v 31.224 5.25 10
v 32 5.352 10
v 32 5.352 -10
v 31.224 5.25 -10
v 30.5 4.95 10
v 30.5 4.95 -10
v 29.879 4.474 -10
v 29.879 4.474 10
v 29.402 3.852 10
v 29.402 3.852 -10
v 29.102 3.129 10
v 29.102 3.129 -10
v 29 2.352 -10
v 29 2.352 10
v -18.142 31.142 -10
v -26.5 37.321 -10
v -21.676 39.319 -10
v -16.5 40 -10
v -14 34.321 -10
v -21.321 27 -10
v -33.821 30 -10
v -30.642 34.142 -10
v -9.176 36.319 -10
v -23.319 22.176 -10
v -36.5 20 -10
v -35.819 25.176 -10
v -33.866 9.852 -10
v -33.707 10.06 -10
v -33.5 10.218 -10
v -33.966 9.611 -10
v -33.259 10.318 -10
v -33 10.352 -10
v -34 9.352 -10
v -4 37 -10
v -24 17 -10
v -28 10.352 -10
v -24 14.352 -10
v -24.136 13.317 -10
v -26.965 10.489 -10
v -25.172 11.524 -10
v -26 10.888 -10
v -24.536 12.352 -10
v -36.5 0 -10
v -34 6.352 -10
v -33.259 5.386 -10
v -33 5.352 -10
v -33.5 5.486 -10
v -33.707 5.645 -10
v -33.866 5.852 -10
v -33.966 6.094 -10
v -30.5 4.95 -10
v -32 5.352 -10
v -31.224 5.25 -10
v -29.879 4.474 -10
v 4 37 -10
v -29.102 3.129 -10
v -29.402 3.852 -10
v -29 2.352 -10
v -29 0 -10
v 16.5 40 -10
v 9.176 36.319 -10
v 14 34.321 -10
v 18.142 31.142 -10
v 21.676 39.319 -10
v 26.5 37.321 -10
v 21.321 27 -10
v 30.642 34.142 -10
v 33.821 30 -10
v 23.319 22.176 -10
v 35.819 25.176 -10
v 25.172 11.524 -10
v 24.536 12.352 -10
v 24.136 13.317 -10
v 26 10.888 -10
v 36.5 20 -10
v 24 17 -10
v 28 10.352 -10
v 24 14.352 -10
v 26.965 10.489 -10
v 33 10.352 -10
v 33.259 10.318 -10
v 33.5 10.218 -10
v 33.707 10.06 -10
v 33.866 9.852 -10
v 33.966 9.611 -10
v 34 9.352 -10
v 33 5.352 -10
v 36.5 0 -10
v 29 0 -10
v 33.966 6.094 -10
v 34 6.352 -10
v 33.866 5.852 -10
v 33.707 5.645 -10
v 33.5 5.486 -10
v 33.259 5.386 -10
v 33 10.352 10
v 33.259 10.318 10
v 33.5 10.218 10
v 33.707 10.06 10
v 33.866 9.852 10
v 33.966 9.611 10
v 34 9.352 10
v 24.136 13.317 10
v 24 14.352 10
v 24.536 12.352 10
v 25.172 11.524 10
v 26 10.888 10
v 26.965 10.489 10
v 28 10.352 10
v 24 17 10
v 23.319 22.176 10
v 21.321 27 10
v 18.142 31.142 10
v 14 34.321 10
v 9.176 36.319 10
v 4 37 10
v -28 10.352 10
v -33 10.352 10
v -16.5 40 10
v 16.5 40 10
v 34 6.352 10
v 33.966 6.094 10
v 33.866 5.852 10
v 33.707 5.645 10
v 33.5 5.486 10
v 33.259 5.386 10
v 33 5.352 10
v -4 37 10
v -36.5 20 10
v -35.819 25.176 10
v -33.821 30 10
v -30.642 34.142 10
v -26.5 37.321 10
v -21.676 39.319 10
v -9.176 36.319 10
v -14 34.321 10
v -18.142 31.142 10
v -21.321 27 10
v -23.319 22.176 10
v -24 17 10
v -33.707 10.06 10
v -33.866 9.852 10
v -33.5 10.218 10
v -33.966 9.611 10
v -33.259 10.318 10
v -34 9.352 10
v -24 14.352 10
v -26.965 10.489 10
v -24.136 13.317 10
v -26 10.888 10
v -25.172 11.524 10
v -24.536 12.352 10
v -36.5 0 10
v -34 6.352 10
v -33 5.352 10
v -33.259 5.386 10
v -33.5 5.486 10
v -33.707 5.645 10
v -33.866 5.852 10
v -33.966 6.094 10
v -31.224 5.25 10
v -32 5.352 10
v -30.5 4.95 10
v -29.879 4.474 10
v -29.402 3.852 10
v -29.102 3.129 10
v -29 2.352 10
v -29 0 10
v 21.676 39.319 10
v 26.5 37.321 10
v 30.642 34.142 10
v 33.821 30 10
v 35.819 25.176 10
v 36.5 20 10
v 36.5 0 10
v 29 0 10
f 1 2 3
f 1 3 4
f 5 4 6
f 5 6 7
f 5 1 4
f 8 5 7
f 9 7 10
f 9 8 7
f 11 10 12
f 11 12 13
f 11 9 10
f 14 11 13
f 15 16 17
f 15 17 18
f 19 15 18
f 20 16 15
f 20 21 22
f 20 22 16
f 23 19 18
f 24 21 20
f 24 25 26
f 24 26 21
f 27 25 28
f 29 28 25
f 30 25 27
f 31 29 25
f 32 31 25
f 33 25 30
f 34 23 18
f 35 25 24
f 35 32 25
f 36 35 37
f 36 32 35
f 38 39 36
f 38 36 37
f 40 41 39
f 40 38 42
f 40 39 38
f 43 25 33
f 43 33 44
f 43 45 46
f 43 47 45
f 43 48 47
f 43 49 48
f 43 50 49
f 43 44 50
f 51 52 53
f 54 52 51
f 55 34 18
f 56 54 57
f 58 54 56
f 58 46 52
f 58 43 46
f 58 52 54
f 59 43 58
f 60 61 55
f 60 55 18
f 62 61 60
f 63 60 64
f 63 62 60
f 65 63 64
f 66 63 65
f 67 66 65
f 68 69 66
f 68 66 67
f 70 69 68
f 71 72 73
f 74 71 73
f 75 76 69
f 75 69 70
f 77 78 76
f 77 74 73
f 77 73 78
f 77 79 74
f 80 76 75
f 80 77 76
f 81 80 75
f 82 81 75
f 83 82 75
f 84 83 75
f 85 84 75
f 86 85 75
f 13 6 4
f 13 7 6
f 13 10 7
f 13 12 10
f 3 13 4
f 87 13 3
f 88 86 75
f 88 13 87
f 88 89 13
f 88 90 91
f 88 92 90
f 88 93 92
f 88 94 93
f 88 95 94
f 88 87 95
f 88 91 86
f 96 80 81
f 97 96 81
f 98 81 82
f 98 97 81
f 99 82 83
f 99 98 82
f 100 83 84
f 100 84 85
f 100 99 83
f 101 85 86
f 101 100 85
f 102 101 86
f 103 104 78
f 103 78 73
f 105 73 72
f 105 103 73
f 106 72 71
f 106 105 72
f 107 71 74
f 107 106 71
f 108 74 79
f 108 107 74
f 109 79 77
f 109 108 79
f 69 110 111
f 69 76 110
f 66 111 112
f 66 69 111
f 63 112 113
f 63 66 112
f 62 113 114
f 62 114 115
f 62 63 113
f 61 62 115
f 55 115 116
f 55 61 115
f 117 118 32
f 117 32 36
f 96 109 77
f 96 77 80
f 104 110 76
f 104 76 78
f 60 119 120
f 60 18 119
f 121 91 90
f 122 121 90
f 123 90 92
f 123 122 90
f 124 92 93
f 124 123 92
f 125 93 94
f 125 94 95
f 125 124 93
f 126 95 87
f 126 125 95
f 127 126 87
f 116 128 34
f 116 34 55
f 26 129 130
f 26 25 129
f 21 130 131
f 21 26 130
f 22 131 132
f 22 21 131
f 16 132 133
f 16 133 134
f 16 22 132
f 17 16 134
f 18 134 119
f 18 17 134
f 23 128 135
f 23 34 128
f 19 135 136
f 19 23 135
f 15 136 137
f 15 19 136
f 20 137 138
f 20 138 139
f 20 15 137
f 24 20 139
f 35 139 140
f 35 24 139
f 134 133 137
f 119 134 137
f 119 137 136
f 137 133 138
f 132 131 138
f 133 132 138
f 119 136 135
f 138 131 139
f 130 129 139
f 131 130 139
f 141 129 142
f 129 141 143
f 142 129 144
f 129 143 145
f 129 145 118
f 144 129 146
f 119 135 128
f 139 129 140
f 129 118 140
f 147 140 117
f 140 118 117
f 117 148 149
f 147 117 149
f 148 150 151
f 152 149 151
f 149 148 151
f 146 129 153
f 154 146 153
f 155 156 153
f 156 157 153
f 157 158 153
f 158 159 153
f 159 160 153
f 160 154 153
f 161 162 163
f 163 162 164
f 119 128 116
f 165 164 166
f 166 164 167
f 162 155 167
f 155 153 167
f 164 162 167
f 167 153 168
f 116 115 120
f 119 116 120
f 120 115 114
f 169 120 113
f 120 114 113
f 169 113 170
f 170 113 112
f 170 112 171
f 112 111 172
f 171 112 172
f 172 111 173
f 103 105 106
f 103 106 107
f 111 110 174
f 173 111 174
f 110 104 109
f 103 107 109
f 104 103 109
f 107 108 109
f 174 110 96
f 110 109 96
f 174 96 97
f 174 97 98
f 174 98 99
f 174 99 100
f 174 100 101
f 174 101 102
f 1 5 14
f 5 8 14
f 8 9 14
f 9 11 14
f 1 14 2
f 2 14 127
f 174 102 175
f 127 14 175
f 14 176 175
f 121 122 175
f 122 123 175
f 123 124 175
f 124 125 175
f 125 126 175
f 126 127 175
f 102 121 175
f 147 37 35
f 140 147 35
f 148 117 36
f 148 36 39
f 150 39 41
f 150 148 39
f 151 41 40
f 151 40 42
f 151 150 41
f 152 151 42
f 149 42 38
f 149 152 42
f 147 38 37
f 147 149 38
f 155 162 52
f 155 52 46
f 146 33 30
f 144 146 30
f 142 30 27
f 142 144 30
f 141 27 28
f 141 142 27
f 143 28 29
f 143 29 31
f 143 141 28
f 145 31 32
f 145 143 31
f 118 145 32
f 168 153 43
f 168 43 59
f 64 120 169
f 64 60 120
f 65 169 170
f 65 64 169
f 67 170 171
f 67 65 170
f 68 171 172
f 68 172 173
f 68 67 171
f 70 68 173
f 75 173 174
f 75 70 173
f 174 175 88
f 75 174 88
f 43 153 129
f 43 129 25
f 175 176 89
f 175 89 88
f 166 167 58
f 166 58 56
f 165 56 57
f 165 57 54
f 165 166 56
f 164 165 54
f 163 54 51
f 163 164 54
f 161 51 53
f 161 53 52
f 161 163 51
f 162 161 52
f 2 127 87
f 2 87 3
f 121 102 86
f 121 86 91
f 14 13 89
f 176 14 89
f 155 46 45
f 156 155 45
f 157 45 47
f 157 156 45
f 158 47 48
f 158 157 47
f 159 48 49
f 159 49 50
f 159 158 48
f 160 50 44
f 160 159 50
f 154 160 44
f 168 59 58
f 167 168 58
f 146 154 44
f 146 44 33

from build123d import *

# Parameters (mm, degrees)
SKETCH1_W           = 73
SKETCH1_H           = 20
BOSS_EXTRUDE1_DEPTH = 40
CUT_EXTRUDE1_DEPTH  = 20
FILLET1_R           = 20
FILLET2_R           = 20


with BuildPart() as part:
    # Sketch1 → Boss-Extrude1 (new body)
    with BuildSketch(Plane(origin=(0, 0, 0), x_dir=(1, 0, 0), z_dir=(0, 1, 0))):
        Rectangle(SKETCH1_W, SKETCH1_H)
    extrude(amount=BOSS_EXTRUDE1_DEPTH)

    # Sketch2 → Cut-Extrude1 (cut)
    with BuildSketch(Plane.XY.offset(10)):
        with BuildLine():
            Line((-29, 0), (-29, 2.352421437))
            ThreePointArc((-29, 2.352421437), (-29.878679656, 4.473741781), (-32, 5.352421437))
            Line((-32, 5.352421437), (-33, 5.352421437))
            ThreePointArc((-33, 5.352421437), (-33.707106781, 5.645314656), (-34, 6.352421437))
            Line((-34, 6.352421437), (-34, 9.352421437))
            ThreePointArc((-34, 9.352421437), (-33.707106781, 10.059528218), (-33, 10.352421437))
            Line((-33, 10.352421437), (-31, 10.352421437))
            Line((-31, 10.352421437), (-28, 10.352421437))
            ThreePointArc((-28, 10.352421437), (-25.171572875, 11.523994313), (-24, 14.352421437))
            Line((-24, 14.352421437), (-24, 37))
            Line((-24, 37), (24, 37))
            Line((24, 37), (24, 14.352421437))
            ThreePointArc((24, 14.352421437), (25.171572875, 11.523994313), (28, 10.352421437))
            Line((28, 10.352421437), (31, 10.352421437))
            Line((31, 10.352421437), (33, 10.352421437))
            ThreePointArc((33, 10.352421437), (33.707106781, 10.059528218), (34, 9.352421437))
            Line((34, 9.352421437), (34, 6.352421437))
            ThreePointArc((34, 6.352421437), (33.707106781, 5.645314656), (33, 5.352421437))
            Line((33, 5.352421437), (32, 5.352421437))
            ThreePointArc((32, 5.352421437), (29.878679656, 4.473741781), (29, 2.352421437))
            Line((29, 2.352421437), (29, 0))
            Line((29, 0), (-29, 0))
        make_face()
    extrude(amount=-CUT_EXTRUDE1_DEPTH, mode=Mode.SUBTRACT)

    # Fillet1
    fillet1_edges = [part.edges().sort_by_distance(p)[0] for p in [
        (36.5, 40, 0),
        (-36.5, 40, 0),
    ]]
    fillet(fillet1_edges, radius=FILLET1_R)

    # Fillet2
    fillet2_edges = [part.edges().sort_by_distance(p)[0] for p in [
        (-24, 37, 0),
        (24, 37, 0),
    ]]
    fillet(fillet2_edges, radius=FILLET2_R)


solid = part.part
